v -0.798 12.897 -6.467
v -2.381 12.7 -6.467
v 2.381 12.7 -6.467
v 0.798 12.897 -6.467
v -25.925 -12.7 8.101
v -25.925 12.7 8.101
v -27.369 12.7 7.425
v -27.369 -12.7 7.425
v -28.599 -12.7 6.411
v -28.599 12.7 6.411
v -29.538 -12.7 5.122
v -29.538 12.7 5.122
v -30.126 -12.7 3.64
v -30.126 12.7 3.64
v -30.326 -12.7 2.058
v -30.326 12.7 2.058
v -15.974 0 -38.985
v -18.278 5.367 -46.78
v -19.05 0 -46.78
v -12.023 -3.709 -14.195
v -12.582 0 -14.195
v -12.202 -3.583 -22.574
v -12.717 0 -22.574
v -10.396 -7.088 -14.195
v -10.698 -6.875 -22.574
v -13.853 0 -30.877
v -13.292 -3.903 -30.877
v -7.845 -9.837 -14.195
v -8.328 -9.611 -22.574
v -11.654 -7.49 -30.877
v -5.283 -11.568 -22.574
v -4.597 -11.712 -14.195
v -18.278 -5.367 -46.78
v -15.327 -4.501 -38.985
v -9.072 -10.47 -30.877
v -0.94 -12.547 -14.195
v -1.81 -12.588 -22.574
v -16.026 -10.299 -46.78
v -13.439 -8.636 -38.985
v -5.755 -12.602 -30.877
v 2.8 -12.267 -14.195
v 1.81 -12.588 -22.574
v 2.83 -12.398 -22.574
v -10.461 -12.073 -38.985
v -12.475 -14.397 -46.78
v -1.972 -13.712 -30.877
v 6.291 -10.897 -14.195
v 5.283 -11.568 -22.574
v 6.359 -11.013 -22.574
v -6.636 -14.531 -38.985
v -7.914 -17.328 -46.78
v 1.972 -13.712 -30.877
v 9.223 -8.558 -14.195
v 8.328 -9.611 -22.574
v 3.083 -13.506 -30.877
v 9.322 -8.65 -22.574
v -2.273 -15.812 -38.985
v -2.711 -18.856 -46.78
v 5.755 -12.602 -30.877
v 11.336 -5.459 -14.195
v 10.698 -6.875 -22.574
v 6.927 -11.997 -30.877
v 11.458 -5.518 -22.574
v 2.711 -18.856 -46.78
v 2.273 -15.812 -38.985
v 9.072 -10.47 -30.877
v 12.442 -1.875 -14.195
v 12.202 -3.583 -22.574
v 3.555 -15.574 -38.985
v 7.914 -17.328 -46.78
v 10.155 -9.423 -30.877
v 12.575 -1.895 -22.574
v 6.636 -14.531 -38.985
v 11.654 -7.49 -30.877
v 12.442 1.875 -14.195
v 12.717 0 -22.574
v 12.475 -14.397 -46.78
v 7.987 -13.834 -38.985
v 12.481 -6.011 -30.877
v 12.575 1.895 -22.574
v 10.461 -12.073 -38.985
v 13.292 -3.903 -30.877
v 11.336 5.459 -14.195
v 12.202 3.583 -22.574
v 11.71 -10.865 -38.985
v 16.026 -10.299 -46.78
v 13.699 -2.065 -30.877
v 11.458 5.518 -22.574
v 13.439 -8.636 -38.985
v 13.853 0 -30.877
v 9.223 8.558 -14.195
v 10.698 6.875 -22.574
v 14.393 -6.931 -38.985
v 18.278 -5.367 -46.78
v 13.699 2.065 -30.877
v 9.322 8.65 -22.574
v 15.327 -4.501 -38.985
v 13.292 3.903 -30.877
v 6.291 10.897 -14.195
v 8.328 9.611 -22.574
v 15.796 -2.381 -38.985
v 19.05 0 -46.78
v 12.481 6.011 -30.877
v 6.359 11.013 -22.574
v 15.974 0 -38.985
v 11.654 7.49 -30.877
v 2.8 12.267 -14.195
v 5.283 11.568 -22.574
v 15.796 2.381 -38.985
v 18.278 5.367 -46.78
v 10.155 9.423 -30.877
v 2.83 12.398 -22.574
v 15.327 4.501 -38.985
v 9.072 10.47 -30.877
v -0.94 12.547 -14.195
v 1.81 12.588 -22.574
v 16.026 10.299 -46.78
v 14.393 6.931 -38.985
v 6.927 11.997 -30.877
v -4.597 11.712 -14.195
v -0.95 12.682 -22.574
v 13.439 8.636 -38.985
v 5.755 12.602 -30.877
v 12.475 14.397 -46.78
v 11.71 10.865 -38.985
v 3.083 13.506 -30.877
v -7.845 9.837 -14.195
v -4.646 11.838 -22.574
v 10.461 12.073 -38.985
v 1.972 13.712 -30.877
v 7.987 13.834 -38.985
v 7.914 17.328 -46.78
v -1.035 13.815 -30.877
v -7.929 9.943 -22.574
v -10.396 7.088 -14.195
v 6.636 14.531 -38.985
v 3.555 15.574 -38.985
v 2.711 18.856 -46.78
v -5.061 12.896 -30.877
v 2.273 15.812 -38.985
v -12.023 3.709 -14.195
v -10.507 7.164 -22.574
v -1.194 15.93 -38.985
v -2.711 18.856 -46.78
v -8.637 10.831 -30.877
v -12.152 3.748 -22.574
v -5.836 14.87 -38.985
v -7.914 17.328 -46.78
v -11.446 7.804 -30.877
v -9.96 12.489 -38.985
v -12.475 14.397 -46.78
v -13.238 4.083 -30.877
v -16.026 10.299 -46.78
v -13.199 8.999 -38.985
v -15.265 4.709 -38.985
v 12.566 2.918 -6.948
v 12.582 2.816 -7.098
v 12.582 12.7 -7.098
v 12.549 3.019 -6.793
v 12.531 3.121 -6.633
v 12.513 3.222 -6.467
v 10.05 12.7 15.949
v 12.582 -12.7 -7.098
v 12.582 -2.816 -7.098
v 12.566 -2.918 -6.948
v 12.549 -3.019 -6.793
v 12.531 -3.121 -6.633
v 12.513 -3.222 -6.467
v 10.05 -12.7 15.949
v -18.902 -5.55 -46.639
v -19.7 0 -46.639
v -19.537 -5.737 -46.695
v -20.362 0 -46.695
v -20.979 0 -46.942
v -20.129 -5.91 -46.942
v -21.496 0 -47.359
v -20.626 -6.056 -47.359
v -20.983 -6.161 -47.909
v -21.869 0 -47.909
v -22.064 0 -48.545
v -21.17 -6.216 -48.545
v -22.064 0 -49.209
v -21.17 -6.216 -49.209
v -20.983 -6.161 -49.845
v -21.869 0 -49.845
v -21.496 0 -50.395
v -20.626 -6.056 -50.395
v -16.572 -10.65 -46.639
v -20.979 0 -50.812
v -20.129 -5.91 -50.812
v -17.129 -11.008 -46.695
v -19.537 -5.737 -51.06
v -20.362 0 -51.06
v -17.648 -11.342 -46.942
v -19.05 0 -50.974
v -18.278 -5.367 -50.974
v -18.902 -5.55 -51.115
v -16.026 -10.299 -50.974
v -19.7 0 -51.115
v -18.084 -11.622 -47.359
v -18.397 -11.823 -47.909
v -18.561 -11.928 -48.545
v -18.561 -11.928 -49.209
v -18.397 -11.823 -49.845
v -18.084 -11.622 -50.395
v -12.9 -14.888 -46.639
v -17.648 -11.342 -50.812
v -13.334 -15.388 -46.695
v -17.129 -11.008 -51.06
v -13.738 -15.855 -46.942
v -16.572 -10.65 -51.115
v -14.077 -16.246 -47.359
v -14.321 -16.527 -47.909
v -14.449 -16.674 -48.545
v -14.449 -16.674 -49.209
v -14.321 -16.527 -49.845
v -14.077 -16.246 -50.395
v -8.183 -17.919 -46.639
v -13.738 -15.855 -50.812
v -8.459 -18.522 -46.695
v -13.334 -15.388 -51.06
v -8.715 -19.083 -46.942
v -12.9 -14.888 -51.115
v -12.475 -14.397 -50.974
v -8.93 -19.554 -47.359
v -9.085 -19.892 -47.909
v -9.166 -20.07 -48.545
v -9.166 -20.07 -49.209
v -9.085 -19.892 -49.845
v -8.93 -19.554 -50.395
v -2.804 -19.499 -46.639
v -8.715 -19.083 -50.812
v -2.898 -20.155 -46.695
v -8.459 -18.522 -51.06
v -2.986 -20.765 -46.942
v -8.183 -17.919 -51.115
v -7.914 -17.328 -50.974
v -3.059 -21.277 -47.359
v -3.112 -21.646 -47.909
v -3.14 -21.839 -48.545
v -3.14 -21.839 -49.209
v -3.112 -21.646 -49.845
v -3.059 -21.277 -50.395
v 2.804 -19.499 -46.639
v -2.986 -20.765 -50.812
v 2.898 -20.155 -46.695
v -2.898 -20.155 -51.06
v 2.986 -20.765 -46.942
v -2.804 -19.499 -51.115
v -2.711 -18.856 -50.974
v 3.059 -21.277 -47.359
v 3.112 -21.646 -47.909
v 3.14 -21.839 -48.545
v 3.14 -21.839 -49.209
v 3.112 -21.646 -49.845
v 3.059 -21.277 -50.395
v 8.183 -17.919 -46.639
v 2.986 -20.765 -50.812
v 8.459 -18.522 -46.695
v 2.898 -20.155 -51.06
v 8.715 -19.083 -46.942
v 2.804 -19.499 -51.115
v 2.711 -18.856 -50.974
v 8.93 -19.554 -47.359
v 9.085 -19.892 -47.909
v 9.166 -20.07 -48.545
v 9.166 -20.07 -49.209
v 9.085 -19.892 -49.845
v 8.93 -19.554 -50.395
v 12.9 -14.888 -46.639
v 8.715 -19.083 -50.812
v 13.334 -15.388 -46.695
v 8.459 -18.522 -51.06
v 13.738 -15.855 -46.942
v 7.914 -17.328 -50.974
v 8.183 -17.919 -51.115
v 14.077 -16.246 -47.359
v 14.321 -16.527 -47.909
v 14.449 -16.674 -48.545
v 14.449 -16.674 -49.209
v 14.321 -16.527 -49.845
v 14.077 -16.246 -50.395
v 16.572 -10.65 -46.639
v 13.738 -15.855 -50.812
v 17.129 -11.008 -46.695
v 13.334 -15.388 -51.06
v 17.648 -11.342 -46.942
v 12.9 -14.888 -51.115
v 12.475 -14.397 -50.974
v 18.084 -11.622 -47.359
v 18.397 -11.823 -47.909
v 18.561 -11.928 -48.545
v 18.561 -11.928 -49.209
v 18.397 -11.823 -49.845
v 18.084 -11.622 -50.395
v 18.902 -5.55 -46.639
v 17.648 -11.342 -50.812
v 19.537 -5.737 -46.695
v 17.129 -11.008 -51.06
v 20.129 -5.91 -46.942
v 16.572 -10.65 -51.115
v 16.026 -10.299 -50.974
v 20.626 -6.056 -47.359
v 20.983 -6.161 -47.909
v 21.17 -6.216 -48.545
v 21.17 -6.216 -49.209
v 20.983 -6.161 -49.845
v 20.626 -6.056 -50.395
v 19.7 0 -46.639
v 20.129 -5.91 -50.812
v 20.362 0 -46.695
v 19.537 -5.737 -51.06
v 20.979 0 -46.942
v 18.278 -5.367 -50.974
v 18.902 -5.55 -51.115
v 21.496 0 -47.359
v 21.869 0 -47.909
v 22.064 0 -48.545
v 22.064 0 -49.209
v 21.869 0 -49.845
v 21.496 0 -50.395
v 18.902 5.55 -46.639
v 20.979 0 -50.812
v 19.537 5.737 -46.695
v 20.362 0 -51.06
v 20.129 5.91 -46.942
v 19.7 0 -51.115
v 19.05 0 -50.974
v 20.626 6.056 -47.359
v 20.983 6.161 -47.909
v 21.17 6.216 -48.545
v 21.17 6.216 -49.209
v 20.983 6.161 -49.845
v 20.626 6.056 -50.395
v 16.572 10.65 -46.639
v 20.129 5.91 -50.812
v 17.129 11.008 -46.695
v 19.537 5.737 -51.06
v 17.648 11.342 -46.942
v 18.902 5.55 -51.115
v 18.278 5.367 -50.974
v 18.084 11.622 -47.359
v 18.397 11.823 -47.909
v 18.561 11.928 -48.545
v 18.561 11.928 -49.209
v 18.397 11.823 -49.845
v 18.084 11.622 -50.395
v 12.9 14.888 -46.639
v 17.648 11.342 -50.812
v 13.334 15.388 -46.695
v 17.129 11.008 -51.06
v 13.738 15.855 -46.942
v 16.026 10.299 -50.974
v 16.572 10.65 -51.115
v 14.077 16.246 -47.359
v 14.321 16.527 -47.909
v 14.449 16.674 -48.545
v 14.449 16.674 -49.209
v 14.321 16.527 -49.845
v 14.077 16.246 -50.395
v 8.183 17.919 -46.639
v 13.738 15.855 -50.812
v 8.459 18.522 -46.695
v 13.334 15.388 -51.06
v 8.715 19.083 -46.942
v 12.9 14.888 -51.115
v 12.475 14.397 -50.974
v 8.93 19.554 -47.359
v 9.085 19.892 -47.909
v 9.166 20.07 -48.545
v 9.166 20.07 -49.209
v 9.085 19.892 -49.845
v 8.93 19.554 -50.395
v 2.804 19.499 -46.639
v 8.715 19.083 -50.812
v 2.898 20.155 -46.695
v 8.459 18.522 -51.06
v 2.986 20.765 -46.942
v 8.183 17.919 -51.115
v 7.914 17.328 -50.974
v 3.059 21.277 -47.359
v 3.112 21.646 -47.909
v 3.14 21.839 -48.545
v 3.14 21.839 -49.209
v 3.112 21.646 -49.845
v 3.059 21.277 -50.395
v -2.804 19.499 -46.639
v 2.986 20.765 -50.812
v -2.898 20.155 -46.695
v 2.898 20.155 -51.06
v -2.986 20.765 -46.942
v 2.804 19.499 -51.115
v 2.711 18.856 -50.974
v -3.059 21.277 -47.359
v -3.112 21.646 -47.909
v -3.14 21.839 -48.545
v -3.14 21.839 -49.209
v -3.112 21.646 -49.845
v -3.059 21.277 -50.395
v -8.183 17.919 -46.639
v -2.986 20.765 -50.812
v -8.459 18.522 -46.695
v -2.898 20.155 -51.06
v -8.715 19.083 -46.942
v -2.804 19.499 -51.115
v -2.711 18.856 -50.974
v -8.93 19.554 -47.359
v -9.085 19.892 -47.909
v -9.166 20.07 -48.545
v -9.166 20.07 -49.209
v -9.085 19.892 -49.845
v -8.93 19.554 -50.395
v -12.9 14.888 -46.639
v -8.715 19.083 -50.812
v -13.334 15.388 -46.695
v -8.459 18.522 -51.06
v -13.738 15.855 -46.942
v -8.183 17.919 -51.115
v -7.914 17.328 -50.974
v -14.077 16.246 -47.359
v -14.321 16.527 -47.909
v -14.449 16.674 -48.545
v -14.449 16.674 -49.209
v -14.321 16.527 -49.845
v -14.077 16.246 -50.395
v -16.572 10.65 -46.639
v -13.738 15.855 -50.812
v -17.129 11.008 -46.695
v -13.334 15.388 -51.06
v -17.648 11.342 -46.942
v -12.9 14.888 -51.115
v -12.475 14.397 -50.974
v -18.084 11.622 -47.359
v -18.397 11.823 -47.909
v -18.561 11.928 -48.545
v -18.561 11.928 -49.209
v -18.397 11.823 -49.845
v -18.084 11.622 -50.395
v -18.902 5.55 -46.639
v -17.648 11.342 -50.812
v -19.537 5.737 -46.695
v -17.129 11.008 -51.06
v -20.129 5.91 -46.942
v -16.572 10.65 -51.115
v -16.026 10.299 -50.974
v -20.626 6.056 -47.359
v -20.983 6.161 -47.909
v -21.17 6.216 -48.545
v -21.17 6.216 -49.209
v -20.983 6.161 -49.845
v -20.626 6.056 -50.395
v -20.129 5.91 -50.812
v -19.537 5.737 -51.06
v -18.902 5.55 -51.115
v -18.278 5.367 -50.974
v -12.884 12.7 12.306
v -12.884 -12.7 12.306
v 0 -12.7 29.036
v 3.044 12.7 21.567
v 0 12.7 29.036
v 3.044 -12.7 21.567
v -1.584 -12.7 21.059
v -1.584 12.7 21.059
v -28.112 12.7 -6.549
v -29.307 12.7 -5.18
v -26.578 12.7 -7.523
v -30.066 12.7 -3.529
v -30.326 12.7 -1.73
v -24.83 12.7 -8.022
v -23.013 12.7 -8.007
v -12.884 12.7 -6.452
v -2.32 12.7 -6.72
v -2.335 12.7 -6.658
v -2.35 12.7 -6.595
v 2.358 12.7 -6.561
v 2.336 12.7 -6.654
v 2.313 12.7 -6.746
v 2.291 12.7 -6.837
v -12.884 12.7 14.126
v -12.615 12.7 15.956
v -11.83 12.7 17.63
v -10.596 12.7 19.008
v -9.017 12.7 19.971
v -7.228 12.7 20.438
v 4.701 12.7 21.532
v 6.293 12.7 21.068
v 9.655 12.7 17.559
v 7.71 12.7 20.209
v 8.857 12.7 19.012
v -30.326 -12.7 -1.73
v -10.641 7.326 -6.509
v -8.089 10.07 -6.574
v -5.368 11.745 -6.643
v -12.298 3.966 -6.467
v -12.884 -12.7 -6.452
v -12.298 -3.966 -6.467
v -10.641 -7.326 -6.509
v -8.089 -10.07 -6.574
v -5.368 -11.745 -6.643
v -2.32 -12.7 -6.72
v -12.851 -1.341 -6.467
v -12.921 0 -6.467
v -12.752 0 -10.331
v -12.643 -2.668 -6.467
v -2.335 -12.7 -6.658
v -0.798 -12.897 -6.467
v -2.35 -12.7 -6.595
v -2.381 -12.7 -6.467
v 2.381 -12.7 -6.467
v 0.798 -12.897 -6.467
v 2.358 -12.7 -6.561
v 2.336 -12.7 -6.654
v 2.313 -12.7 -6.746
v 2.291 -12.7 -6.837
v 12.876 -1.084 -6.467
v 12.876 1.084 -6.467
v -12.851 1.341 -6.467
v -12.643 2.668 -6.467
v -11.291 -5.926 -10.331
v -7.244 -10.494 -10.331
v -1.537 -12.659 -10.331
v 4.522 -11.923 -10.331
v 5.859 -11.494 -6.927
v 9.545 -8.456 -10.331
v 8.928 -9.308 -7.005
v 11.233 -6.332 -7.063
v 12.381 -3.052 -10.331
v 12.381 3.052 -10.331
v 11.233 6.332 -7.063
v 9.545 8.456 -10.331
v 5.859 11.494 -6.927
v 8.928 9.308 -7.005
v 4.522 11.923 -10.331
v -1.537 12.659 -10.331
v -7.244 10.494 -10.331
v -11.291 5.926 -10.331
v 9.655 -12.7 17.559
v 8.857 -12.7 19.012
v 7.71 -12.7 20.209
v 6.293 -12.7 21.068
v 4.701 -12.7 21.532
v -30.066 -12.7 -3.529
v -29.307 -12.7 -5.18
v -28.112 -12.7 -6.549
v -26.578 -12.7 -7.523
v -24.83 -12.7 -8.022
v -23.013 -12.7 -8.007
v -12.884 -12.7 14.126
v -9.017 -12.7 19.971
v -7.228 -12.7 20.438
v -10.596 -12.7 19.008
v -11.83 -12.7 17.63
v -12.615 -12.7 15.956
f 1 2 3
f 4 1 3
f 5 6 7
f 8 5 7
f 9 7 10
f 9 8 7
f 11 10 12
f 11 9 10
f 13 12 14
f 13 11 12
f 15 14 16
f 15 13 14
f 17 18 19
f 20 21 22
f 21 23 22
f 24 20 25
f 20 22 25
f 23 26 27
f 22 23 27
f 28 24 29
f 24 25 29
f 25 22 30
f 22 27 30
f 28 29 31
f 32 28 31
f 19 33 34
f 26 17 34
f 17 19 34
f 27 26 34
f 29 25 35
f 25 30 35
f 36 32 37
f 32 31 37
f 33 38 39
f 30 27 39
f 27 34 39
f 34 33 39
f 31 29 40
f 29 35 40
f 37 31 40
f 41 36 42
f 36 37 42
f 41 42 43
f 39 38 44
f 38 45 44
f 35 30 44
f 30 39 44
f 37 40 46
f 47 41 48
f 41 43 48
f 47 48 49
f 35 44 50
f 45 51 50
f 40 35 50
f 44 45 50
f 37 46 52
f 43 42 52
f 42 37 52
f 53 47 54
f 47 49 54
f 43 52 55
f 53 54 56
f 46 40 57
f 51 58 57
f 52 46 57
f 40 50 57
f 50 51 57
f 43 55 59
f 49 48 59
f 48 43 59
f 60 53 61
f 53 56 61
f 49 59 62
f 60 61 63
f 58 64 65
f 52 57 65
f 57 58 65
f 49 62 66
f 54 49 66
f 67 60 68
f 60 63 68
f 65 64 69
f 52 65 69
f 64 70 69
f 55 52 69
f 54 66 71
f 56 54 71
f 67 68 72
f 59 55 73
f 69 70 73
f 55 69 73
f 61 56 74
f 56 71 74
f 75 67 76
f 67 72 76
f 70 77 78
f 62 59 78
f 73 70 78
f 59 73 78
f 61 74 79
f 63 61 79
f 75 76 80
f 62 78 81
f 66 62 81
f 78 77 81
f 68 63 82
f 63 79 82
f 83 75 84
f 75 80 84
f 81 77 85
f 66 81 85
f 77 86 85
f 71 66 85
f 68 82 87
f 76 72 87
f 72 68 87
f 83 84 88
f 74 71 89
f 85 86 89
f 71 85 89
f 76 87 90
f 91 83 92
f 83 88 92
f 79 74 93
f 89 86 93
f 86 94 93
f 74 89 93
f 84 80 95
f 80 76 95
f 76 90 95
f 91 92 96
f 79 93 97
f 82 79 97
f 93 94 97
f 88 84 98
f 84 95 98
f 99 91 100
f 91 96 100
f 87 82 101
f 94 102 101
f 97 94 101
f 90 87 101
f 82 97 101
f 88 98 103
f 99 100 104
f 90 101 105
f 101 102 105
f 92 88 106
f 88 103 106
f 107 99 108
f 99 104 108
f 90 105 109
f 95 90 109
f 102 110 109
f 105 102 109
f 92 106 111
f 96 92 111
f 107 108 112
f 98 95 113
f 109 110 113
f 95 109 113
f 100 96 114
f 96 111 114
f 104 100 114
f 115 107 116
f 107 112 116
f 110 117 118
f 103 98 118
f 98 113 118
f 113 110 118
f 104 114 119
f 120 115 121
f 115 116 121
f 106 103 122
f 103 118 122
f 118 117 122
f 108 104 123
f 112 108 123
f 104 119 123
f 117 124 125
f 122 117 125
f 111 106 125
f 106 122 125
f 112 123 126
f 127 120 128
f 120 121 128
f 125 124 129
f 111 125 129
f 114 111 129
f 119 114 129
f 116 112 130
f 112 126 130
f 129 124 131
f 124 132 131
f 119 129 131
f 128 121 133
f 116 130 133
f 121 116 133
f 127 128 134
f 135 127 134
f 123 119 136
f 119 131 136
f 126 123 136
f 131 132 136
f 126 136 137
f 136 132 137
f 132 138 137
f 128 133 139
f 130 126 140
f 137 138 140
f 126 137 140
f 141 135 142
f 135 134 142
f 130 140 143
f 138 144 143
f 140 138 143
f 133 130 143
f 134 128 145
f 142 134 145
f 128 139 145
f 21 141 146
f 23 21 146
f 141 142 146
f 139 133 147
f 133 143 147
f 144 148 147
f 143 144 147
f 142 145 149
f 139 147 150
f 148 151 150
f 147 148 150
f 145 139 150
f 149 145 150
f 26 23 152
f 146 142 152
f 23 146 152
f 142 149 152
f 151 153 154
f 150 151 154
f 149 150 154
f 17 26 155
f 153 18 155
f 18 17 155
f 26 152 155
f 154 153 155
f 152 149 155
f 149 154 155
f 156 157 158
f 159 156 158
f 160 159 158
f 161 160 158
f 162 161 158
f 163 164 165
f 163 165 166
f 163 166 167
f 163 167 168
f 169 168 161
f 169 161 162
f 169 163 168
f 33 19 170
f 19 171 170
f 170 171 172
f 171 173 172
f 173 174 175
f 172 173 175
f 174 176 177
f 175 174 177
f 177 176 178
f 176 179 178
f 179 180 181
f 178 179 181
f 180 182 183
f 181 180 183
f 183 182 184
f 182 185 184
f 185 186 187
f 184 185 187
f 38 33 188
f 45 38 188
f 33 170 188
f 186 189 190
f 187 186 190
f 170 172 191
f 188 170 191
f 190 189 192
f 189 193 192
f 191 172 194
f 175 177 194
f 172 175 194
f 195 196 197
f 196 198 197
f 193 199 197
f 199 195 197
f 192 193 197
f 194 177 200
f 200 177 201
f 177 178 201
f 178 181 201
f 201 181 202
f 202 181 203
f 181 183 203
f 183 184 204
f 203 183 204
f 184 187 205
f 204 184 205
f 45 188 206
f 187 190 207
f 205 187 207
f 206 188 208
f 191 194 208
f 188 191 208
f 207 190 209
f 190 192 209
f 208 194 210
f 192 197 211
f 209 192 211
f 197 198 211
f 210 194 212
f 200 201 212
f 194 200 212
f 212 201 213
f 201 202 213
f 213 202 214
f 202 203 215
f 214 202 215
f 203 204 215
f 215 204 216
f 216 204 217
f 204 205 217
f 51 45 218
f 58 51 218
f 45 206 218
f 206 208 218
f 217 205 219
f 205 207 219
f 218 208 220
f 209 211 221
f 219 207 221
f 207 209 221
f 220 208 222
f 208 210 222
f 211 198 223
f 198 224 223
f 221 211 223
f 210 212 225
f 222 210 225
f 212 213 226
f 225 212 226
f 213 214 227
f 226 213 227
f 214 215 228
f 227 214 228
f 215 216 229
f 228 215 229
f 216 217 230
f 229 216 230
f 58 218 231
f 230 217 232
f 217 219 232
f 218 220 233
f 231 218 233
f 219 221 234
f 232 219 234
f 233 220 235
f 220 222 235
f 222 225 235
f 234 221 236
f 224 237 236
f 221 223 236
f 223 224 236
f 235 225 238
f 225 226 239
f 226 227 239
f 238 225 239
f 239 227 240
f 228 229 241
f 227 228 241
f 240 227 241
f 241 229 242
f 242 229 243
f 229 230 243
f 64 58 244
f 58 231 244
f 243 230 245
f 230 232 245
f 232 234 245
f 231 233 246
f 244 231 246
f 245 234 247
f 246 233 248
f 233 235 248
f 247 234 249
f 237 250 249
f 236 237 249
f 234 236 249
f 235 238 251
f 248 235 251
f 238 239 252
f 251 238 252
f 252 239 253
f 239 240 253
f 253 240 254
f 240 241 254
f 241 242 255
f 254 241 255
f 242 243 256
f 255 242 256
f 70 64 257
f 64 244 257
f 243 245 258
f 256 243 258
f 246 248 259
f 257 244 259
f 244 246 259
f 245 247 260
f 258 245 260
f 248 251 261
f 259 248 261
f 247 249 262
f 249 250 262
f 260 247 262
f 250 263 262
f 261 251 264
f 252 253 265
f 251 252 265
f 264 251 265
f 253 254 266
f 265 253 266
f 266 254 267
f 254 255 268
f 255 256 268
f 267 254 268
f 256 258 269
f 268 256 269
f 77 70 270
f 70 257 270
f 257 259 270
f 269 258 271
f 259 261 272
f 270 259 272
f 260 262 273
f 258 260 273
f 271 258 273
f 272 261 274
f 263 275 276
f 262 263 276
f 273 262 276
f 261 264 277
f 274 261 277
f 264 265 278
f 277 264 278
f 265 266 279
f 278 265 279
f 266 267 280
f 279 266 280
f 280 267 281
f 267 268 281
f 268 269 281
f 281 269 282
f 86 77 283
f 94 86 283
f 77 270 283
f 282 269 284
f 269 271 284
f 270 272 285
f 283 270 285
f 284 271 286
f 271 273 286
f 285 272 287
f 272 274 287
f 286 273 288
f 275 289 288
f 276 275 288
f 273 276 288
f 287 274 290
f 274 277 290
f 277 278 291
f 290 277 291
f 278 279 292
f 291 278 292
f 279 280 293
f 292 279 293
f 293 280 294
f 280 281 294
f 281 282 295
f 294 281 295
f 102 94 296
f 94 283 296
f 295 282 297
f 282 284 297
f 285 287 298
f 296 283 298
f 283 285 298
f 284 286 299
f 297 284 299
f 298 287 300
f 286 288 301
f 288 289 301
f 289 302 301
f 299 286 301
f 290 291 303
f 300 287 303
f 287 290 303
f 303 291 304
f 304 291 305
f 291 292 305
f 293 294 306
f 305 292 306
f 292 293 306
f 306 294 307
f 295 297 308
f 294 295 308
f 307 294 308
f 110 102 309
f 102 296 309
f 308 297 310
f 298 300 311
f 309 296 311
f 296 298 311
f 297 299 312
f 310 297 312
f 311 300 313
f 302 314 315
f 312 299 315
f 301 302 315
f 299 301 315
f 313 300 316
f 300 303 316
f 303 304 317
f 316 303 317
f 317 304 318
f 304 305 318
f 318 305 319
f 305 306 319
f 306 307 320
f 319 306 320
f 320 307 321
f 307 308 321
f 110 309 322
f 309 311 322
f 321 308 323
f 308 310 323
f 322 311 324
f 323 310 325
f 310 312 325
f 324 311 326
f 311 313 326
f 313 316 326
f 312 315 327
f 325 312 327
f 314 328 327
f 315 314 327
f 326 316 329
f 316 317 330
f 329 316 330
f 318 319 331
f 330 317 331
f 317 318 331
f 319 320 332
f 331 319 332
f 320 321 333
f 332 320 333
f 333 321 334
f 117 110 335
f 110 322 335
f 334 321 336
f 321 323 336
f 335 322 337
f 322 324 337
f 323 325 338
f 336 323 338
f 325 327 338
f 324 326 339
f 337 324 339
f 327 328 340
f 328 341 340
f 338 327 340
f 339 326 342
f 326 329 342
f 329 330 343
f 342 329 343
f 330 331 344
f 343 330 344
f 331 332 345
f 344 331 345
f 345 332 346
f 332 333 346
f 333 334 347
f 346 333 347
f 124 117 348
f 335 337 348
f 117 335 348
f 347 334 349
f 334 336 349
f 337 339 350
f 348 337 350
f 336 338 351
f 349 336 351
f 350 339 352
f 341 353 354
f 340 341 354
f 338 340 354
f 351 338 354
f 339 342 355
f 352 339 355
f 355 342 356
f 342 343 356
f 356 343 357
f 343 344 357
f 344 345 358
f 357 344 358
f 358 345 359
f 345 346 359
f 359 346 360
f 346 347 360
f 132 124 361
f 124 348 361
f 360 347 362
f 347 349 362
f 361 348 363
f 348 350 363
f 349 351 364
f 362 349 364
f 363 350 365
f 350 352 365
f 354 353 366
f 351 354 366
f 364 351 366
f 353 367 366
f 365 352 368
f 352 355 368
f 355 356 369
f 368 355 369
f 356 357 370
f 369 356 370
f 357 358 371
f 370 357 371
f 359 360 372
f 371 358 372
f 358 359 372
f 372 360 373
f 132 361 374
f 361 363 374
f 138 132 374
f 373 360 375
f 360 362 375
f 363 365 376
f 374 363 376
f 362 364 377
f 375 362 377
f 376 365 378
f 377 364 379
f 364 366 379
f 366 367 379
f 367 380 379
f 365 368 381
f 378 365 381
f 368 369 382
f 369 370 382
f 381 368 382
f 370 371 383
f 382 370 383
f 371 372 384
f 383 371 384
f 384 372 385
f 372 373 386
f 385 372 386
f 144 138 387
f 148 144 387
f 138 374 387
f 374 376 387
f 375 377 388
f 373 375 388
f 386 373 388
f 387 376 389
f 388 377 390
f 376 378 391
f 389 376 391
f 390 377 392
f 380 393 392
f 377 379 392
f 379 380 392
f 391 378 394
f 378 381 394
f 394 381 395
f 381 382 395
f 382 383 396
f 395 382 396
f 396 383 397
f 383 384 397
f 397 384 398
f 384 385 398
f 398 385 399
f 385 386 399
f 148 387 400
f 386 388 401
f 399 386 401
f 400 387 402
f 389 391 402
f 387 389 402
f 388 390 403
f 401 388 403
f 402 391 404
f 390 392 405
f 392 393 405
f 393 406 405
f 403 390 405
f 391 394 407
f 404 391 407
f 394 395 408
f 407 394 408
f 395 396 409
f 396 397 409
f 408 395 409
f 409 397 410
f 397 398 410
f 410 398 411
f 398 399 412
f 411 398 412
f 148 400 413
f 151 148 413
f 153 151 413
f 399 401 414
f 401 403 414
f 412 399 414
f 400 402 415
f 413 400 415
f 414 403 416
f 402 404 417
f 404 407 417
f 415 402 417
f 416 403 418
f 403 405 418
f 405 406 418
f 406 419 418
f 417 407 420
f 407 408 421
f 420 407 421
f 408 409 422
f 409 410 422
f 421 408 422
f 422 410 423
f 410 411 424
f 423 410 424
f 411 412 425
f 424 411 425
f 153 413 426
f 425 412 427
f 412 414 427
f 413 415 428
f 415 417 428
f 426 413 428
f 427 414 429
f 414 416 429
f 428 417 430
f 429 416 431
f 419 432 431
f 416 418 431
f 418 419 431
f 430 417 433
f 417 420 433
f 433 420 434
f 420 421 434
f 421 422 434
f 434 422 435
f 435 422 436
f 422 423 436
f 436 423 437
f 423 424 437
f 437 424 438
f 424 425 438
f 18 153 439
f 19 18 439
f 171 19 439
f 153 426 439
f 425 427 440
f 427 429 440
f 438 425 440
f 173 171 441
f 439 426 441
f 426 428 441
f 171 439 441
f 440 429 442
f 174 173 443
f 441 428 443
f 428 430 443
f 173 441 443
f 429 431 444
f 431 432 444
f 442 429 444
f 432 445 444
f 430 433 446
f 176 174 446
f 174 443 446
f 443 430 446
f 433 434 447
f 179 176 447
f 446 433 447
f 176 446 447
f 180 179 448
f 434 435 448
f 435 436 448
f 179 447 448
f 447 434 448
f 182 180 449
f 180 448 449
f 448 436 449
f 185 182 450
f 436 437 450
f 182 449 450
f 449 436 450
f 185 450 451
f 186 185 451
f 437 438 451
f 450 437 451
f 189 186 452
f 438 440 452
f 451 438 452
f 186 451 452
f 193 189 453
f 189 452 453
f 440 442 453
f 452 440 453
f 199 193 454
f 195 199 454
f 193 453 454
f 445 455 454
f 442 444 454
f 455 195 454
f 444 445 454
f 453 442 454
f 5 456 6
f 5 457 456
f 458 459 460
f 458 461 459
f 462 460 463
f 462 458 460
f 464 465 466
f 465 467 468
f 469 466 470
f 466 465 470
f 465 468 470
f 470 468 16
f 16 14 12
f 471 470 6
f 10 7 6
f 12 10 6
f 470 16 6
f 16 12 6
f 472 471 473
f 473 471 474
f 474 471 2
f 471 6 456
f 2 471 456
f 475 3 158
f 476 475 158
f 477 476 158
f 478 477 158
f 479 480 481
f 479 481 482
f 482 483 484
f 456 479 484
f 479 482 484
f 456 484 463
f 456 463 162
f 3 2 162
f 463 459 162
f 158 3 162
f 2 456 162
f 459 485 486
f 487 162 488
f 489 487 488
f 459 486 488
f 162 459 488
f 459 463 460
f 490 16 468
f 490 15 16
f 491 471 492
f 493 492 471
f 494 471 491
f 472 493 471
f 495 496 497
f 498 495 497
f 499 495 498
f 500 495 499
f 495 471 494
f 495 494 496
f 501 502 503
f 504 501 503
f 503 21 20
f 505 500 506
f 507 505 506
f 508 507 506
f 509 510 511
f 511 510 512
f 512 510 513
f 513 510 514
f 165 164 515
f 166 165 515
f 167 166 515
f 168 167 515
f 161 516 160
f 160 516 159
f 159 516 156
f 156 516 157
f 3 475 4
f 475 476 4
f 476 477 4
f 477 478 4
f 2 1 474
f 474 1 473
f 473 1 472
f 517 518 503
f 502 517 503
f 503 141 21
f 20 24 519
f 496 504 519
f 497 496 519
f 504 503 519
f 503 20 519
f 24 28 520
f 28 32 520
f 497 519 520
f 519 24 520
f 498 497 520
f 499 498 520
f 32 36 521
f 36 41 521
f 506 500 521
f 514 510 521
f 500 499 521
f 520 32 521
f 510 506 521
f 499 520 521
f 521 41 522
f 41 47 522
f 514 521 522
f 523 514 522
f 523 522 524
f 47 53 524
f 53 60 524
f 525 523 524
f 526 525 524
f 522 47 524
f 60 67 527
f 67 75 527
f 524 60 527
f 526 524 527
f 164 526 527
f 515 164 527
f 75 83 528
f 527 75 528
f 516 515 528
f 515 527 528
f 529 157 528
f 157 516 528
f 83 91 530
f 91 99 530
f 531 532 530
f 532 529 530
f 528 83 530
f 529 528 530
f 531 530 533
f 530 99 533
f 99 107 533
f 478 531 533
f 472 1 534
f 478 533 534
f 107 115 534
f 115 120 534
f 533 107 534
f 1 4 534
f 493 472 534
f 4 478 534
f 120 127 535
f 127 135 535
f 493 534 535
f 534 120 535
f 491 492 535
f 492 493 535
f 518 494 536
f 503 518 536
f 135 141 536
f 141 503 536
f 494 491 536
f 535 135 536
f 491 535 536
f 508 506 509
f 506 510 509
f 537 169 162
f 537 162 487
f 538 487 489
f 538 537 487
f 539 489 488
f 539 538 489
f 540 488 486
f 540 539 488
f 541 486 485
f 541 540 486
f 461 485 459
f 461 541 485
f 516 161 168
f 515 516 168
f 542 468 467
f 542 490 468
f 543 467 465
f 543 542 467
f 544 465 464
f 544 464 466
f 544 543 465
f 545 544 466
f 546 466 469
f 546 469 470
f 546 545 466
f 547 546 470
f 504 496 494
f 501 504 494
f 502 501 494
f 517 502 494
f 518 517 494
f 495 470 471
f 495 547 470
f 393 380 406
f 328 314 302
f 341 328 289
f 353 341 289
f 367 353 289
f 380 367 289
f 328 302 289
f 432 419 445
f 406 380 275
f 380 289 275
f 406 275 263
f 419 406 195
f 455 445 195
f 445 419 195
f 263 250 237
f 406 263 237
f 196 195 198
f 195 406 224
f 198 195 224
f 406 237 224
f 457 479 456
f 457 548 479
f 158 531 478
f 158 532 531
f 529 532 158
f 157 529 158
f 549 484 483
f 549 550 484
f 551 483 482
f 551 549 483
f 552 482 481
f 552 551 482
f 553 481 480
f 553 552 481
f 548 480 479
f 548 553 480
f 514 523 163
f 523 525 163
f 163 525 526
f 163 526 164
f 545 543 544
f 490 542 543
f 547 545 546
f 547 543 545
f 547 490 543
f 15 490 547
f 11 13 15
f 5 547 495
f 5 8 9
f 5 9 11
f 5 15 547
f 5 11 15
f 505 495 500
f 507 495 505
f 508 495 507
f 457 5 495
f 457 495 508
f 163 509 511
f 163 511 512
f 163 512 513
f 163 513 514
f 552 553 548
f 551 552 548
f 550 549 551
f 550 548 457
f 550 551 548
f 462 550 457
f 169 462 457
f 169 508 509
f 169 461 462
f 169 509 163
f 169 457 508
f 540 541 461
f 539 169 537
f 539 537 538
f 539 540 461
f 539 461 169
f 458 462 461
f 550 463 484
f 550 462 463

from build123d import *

# Parameters (mm, degrees)
F3_DEPTH = 12.7
F4_DEPTH = 12.7


with BuildPart() as f1:
    # F0 (on Front) → F1 (revolve)
    with BuildSketch(Plane.XZ):
        with BuildLine():
            Line((-19.05, -50.974112), (0, -50.974112))
            Line((0, -50.974112), (0, -6.467288))
            Line((0, -6.467288), (-12.921196, -6.467288))
            Line((-12.921196, -6.467288), (-12.582219, -14.195322))
            ThreePointArc((-12.582219, -14.195322), (-13.853409, -30.877259), (-19.05, -46.780039))
            ThreePointArc((-19.05, -46.780039), (-22.088268, -48.877075), (-19.05, -50.974112))
        make_face()
    revolve(axis=Axis((0, 0, -22.399112), (0, 0, 1)))

    # F2 (on Front) → F3 (join)
    with BuildSketch(Plane.XZ):
        with BuildLine():
            Line((-12.884437, -6.452419), (12.582218, -7.097661))
            Line((12.582218, -7.097661), (10.049637, 15.948844))
            ThreePointArc((10.049637, 15.948844), (7.710426, 20.208945), (3.044008, 21.56722))
            Line((3.044008, 21.56722), (-1.583988, 21.05865))
            Line((-1.583988, 21.05865), (-7.228063, 20.438422))
            ThreePointArc((-7.228063, 20.438422), (-11.263444, 18.364223), (-12.884437, 14.126419))
            Line((-12.884437, 14.126419), (-12.884437, 12.306017))
            Line((-12.884437, 12.306017), (-12.884437, -6.452419))
        make_face()
        with BuildLine():
            Line((-23.013249, -8.006668), (-12.884437, -6.452419))
            Line((-12.884437, -6.452419), (-12.884437, 12.306017))
            Line((-12.884437, 12.306017), (-25.925016, 8.101342))
            ThreePointArc((-25.925016, 8.101342), (-29.109421, 5.795949), (-30.326372, 2.057726))
            Line((-30.326372, 2.057726), (-30.326372, -1.730133))
            ThreePointArc((-30.326372, -1.730133), (-28.11199, -6.54876), (-23.013249, -8.006668))
        make_face()
        Polygon((-1.583988, 21.05865), (3.044008, 21.56722), (0, 29.035889), align=None)
    extrude(amount=F3_DEPTH)

    # F2 (on Front) → F4 (join)
    with BuildSketch(Plane.XZ):
        with BuildLine():
            Line((-12.884437, -6.452419), (12.582218, -7.097661))
            Line((12.582218, -7.097661), (10.049637, 15.948844))
            ThreePointArc((10.049637, 15.948844), (7.710426, 20.208945), (3.044008, 21.56722))
            Line((3.044008, 21.56722), (-1.583988, 21.05865))
            Line((-1.583988, 21.05865), (-7.228063, 20.438422))
            ThreePointArc((-7.228063, 20.438422), (-11.263444, 18.364223), (-12.884437, 14.126419))
            Line((-12.884437, 14.126419), (-12.884437, 12.306017))
            Line((-12.884437, 12.306017), (-12.884437, -6.452419))
        make_face()
        with BuildLine():
            Line((-23.013249, -8.006668), (-12.884437, -6.452419))
            Line((-12.884437, -6.452419), (-12.884437, 12.306017))
            Line((-12.884437, 12.306017), (-25.925016, 8.101342))
            ThreePointArc((-25.925016, 8.101342), (-29.109421, 5.795949), (-30.326372, 2.057726))
            Line((-30.326372, 2.057726), (-30.326372, -1.730133))
            ThreePointArc((-30.326372, -1.730133), (-28.11199, -6.54876), (-23.013249, -8.006668))
        make_face()
        Polygon((-1.583988, 21.05865), (3.044008, 21.56722), (0, 29.035889), align=None)
    extrude(amount=-F4_DEPTH)


solid = f1.part
